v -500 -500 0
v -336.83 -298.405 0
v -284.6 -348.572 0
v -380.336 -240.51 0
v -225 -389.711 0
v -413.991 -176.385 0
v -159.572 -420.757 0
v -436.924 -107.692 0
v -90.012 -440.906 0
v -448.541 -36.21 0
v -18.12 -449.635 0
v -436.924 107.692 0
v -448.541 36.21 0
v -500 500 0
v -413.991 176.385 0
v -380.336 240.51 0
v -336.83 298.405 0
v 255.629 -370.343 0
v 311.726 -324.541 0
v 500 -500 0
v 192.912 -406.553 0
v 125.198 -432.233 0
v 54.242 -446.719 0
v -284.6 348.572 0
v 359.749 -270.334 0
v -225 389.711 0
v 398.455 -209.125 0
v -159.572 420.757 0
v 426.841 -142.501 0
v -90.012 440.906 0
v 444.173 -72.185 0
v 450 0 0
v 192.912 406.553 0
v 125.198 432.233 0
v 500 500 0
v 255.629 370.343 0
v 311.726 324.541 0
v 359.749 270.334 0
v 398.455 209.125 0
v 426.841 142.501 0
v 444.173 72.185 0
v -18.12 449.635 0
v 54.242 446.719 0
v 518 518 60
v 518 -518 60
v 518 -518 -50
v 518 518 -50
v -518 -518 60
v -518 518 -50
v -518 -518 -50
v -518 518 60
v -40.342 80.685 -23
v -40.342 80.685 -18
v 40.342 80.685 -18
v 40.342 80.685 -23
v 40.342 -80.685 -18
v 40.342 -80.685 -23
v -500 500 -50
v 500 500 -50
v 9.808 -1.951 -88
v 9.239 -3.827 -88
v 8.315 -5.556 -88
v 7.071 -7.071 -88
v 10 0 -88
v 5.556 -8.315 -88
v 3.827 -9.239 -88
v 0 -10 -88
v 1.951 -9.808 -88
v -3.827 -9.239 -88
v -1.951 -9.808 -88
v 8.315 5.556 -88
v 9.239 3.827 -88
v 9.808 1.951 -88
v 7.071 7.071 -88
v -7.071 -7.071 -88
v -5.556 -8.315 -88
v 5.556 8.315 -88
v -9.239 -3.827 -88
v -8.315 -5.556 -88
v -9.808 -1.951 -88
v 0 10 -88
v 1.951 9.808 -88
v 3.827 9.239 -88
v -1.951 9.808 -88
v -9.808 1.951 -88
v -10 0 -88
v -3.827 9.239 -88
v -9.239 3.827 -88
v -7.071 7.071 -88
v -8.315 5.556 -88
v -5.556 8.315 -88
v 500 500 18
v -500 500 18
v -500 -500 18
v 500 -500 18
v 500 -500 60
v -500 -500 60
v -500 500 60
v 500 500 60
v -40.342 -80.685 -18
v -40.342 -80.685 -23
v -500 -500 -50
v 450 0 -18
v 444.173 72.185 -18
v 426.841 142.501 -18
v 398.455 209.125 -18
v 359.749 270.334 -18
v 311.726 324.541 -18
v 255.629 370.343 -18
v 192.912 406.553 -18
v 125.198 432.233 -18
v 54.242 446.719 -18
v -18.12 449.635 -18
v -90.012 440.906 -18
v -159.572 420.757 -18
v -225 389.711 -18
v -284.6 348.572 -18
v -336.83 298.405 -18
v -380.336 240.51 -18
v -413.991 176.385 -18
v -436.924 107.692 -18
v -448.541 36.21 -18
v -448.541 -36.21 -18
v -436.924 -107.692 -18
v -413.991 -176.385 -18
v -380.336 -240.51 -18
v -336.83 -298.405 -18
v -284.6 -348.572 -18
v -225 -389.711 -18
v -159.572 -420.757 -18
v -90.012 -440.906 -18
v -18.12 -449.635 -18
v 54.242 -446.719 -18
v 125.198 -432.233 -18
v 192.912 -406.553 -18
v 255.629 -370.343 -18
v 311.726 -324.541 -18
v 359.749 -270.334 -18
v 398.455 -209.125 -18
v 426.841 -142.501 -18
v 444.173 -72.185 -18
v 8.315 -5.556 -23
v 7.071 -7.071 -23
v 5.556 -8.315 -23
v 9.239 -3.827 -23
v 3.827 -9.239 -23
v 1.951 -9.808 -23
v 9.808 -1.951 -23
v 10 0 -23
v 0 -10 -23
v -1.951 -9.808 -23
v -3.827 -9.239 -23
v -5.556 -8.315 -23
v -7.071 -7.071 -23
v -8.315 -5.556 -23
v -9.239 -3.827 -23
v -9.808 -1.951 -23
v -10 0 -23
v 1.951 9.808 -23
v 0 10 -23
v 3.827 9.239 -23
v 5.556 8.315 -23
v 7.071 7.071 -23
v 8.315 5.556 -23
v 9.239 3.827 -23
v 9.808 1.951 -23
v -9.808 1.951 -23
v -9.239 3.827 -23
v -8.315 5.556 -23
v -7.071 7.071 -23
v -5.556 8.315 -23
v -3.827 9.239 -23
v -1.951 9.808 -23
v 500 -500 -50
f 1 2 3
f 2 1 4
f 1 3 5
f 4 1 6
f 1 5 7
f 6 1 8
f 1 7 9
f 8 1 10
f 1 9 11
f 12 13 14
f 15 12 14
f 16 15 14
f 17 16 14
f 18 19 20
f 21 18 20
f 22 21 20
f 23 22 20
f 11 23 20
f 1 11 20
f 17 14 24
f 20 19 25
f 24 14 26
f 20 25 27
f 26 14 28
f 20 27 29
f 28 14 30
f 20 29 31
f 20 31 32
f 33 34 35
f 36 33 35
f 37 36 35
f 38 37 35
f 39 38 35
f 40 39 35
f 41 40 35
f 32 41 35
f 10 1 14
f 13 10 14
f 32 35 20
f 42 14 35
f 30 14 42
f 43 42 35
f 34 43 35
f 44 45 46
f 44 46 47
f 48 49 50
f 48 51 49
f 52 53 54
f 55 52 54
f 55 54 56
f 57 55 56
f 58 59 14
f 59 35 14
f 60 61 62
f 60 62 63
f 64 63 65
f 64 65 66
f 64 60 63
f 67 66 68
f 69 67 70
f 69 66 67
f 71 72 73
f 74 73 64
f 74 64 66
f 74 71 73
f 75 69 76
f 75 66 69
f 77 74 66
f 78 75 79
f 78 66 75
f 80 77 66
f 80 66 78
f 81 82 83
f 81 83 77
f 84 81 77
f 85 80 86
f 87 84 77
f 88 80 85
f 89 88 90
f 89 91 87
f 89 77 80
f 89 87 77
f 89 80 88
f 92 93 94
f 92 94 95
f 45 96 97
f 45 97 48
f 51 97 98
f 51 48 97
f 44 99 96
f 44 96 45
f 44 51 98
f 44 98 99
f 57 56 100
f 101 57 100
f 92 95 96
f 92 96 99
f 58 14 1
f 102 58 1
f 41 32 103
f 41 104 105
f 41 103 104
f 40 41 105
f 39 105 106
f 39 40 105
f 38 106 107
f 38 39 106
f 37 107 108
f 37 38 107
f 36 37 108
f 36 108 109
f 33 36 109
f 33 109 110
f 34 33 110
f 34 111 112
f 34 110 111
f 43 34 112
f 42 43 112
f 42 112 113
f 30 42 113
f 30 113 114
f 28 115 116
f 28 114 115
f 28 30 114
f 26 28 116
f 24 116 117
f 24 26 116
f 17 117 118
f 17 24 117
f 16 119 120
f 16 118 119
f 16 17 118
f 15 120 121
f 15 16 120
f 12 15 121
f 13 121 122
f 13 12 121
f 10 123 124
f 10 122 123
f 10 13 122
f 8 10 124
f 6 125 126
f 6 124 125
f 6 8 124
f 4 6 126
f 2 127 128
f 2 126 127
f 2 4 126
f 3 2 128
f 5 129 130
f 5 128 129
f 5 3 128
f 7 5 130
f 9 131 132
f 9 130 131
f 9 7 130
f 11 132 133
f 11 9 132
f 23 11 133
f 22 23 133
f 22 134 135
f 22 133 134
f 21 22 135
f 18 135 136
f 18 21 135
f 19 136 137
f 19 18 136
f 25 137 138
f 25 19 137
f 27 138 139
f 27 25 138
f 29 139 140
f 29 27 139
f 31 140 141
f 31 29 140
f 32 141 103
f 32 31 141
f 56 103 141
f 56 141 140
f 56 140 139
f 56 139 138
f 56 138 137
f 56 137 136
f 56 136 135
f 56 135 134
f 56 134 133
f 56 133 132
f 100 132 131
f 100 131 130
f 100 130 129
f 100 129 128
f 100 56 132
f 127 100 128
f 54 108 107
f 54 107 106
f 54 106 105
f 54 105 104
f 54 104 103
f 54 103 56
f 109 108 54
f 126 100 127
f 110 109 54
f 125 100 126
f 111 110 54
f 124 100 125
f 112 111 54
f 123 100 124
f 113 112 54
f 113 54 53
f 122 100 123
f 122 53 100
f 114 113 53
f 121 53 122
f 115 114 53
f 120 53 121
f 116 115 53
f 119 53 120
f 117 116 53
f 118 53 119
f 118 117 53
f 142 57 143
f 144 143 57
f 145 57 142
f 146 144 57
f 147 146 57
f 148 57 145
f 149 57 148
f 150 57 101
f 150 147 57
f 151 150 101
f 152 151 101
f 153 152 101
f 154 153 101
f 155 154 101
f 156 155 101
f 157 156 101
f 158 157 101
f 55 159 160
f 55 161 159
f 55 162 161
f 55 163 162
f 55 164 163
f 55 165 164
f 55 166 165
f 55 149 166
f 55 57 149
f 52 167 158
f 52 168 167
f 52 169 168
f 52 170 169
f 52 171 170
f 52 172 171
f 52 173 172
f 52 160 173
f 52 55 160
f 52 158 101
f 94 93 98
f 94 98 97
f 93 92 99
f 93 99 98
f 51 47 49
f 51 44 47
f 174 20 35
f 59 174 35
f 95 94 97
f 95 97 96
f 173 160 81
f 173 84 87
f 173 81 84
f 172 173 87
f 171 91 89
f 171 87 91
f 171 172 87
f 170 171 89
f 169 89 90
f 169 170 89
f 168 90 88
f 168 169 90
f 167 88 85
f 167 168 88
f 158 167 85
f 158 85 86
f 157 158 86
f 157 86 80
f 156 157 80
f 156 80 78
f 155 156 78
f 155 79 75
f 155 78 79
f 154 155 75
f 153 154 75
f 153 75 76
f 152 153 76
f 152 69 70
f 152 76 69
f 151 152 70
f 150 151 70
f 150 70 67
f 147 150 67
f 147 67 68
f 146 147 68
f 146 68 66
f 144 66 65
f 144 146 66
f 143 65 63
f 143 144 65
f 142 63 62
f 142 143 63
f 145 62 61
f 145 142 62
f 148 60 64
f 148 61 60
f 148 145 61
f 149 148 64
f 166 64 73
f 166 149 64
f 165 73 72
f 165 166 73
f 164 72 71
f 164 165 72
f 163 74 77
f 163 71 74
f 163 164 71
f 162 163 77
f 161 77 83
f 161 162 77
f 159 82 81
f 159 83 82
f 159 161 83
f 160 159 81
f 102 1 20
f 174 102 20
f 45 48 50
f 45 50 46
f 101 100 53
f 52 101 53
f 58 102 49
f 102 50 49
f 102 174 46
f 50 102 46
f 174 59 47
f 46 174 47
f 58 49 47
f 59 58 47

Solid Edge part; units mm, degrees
sketch "Sketch1" plane through (0, 0, 0) normal (0, 0, 1) x (1, 0, 0)
  line L0 (-500, -500) -> (500, -500)
  line L1 (500, -500) -> (500, 500)
  line L2 (500, 500) -> (-500, 500)
  line L3 (-500, 500) -> (-500, -500)
extrude "Protrusion1" add sketch "Sketch1" along normal blind 18
sketch "Sketch2" plane through (0, 0, 0) normal (0, 0, -1) x (1, 0, 0)
  circle A0 centre (0, 0) radius 450
extrude "Kihúzás_2" add sketch "Sketch2" along normal blind 18
sketch "Sketch3" plane through (0, 0, -18) normal (0, 0, -1) x (1, 0, 0)
  line L0 (-40.3424, -80.6848) -> (40.3424, -80.6848)
  line L1 (40.3424, -80.6848) -> (40.3424, 80.6848)
  line L2 (40.3424, 80.6848) -> (-40.3424, 80.6848)
  line L3 (-40.3424, 80.6848) -> (-40.3424, -80.6848)
extrude "Kihúzás_5" add sketch "Sketch3" along normal blind 5
sketch "Sketch4" plane through (0, 0, -23) normal (0, 0, -1) x (0, 1, 0)
  circle A0 centre (0, 0) radius 10
extrude "Kihúzás_6" add sketch "Sketch4" along normal blind 65
sketch "Sketch5" plane through (0, 0, 18) normal (0, 0, 1) x (0, -1, 0)
  line L0 (-500, -500) -> (500, -500)
  line L1 (500, -500) -> (500, 500)
  line L2 (500, 500) -> (-500, 500)
  line L3 (-500, 500) -> (-500, -500)
  line L4 (-518, -518) -> (518, -518)
  line L5 (518, -518) -> (518, 518)
  line L6 (518, 518) -> (-518, 518)
  line L7 (-518, 518) -> (-518, -518)
extrude "Kihúzás_9" add sketch "Sketch5" against normal blind 68
sketch "Sketch6" plane through (0, 0, 18) normal (0, 0, 1) x (0, -1, 0)
  line L0 (-500, -500) -> (500, -500)
  line L1 (500, -500) -> (500, 500)
  line L2 (500, 500) -> (-500, 500)
  line L3 (-500, 500) -> (-500, -500)
  line L4 (-518, -518) -> (518, -518)
  line L5 (518, -518) -> (518, 518)
  line L6 (518, 518) -> (-518, 518)
  line L7 (-518, 518) -> (-518, -518)
extrude "Kihúzás_10" add sketch "Sketch6" along normal blind 42
